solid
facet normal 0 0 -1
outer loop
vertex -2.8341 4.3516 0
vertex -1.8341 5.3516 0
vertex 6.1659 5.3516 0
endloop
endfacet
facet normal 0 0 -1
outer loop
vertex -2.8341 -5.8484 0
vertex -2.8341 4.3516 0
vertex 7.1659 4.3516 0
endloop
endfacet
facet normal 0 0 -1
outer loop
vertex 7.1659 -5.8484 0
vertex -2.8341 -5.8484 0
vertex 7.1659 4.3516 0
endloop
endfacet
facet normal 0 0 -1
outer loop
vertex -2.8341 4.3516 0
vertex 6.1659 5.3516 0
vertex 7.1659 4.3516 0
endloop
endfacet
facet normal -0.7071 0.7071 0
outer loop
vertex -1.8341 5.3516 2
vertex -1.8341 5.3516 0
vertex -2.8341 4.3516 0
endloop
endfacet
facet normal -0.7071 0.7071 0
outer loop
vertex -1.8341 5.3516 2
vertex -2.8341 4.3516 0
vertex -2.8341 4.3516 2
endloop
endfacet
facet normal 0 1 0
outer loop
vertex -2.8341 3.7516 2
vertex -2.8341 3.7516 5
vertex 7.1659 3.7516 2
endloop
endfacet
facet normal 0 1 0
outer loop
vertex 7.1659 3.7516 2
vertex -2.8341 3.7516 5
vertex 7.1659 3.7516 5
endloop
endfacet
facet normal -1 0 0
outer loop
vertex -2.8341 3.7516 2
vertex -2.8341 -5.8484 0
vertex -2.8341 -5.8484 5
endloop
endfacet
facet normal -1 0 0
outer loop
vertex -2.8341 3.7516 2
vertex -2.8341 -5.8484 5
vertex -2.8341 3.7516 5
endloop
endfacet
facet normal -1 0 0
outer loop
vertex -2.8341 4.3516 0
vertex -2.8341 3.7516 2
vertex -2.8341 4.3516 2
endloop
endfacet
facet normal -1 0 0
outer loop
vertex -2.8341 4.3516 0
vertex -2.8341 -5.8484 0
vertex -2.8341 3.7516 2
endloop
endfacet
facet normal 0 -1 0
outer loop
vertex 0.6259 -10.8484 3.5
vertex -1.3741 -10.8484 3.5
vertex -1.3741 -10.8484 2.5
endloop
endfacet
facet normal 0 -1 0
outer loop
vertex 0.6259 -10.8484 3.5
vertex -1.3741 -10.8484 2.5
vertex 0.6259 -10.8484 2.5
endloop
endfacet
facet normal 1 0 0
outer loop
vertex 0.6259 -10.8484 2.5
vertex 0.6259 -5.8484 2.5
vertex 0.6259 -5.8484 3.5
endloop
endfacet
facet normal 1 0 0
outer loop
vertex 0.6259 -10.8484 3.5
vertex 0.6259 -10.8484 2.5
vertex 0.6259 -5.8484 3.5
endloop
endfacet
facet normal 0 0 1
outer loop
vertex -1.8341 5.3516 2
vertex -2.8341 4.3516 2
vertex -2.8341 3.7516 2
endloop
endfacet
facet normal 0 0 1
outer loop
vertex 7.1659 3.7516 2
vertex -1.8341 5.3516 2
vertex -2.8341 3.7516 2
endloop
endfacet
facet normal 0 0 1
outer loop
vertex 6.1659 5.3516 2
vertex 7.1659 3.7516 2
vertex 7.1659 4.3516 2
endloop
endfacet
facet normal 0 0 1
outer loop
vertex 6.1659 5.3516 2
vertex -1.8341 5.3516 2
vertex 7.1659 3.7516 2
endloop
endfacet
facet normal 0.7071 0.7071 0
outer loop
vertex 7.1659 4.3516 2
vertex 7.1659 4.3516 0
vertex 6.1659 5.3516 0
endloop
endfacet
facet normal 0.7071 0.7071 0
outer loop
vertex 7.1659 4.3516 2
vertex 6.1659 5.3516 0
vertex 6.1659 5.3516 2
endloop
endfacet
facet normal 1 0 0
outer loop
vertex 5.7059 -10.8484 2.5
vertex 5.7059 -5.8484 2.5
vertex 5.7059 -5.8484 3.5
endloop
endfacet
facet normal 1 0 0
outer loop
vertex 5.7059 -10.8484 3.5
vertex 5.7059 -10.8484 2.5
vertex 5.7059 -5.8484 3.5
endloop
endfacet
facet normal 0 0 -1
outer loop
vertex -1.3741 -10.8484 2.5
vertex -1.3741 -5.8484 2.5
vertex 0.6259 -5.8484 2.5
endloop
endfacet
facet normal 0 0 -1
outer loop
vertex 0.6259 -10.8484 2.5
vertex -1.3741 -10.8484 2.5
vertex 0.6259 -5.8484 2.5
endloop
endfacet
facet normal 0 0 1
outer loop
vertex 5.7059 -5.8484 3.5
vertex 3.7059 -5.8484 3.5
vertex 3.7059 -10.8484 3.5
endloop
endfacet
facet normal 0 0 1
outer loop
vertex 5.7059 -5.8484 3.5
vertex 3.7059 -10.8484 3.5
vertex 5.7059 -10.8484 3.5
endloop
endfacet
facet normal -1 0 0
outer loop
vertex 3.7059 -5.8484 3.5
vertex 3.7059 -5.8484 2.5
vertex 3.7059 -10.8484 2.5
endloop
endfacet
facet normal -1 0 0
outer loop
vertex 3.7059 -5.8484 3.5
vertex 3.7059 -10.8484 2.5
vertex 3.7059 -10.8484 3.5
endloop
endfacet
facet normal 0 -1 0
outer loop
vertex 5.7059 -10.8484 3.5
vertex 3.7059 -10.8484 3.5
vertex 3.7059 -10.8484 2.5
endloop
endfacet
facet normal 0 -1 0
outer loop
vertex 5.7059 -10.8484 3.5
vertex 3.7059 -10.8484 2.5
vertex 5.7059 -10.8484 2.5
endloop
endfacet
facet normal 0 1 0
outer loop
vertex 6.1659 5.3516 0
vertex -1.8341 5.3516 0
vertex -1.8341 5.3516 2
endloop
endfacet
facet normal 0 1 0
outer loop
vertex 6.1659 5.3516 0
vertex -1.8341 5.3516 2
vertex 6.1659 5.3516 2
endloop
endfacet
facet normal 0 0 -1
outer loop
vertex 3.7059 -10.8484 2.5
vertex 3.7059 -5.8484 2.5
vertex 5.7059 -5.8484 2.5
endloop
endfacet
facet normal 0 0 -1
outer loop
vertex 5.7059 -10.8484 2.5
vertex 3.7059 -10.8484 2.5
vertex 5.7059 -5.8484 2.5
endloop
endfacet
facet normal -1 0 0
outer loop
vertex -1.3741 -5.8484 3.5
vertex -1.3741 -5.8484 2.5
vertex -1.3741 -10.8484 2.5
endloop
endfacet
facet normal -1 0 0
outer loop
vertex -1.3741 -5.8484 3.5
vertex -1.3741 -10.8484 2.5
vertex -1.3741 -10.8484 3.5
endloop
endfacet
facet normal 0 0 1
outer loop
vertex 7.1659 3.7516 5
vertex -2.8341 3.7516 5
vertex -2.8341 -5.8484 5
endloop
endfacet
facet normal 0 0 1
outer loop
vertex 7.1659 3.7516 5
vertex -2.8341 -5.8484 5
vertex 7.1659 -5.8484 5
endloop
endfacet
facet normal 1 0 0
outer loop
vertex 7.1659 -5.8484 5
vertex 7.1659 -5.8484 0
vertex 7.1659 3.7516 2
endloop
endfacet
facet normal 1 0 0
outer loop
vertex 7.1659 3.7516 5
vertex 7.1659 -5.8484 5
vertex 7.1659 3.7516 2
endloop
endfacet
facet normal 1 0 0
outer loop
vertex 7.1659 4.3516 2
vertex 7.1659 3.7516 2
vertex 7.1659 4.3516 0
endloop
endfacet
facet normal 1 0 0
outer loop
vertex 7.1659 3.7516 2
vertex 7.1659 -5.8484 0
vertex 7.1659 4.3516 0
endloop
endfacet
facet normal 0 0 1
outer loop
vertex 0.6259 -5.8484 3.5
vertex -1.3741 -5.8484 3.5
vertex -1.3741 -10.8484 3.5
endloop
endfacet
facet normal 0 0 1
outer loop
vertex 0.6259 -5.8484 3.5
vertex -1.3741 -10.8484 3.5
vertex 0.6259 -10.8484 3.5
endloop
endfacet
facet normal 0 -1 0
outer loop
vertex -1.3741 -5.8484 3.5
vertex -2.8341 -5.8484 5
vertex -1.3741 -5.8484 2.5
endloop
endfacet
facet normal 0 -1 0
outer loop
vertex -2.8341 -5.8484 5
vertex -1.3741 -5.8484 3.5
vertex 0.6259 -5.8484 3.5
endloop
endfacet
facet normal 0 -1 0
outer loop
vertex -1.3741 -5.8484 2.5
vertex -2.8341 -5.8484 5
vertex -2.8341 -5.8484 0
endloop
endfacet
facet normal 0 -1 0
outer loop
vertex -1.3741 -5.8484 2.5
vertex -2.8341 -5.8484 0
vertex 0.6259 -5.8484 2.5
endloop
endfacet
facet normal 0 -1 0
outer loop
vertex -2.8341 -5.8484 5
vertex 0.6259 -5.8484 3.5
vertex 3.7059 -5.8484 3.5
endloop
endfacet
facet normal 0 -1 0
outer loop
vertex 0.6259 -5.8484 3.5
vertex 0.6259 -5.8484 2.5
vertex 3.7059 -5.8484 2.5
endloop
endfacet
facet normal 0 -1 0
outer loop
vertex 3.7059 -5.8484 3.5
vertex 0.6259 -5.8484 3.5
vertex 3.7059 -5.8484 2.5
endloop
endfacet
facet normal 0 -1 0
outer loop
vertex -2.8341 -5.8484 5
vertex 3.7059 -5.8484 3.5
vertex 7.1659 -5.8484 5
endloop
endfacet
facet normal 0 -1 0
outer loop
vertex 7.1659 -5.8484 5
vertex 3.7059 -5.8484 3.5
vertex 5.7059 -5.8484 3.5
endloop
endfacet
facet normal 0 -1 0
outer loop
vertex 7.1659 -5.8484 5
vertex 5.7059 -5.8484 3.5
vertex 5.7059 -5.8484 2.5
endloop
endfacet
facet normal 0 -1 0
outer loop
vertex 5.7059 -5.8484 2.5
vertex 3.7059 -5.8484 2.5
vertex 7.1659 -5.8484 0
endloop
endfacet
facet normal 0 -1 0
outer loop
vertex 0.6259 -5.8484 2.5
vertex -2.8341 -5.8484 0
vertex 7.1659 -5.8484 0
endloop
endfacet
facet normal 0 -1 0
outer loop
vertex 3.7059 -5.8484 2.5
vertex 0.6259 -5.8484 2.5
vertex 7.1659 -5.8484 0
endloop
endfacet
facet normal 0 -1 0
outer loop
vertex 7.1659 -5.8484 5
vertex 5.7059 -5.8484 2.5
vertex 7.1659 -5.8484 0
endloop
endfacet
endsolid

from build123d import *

# Parameters (mm, degrees)
F0_W     = 10
F0_H     = 11.2
F1_DEPTH = 5
F2_W     = 10
F2_H     = 1.6
F3_DEPTH = 3
F4_SIZE  = 1
F5_W     = 2
F5_H     = 1
F6_DEPTH = 5


with BuildPart() as f1:
    # F0 (on Top) → F1 (new body)
    with BuildSketch(Plane.XY):
        with Locations((2.165886, -0.248423)):
            Rectangle(F0_W, F0_H)
    extrude(amount=F1_DEPTH)

    # F2 (on face) → F3 (cut)
    with BuildSketch(Plane.XY.offset(5)):
        with Locations((2.165886, 4.551577)):
            Rectangle(F2_W, F2_H)
    extrude(amount=-F3_DEPTH, mode=Mode.SUBTRACT)

    # F4
    f4_edges = [f1.edges().sort_by_distance(p)[0] for p in [
        (7.165886, 5.351577, 1),
        (-2.834114, 5.351577, 1),
    ]]
    chamfer(f4_edges, length=F4_SIZE)

    # F5 (on face) → F6 (join)
    with BuildSketch(Plane.XZ.offset(5.848423)):
        with Locations((-0.374114, 3)):
            Rectangle(F5_W, F5_H)
        with Locations((4.705886, 3)):
            Rectangle(F5_W, F5_H)
    extrude(amount=F6_DEPTH)


solid = f1.part
